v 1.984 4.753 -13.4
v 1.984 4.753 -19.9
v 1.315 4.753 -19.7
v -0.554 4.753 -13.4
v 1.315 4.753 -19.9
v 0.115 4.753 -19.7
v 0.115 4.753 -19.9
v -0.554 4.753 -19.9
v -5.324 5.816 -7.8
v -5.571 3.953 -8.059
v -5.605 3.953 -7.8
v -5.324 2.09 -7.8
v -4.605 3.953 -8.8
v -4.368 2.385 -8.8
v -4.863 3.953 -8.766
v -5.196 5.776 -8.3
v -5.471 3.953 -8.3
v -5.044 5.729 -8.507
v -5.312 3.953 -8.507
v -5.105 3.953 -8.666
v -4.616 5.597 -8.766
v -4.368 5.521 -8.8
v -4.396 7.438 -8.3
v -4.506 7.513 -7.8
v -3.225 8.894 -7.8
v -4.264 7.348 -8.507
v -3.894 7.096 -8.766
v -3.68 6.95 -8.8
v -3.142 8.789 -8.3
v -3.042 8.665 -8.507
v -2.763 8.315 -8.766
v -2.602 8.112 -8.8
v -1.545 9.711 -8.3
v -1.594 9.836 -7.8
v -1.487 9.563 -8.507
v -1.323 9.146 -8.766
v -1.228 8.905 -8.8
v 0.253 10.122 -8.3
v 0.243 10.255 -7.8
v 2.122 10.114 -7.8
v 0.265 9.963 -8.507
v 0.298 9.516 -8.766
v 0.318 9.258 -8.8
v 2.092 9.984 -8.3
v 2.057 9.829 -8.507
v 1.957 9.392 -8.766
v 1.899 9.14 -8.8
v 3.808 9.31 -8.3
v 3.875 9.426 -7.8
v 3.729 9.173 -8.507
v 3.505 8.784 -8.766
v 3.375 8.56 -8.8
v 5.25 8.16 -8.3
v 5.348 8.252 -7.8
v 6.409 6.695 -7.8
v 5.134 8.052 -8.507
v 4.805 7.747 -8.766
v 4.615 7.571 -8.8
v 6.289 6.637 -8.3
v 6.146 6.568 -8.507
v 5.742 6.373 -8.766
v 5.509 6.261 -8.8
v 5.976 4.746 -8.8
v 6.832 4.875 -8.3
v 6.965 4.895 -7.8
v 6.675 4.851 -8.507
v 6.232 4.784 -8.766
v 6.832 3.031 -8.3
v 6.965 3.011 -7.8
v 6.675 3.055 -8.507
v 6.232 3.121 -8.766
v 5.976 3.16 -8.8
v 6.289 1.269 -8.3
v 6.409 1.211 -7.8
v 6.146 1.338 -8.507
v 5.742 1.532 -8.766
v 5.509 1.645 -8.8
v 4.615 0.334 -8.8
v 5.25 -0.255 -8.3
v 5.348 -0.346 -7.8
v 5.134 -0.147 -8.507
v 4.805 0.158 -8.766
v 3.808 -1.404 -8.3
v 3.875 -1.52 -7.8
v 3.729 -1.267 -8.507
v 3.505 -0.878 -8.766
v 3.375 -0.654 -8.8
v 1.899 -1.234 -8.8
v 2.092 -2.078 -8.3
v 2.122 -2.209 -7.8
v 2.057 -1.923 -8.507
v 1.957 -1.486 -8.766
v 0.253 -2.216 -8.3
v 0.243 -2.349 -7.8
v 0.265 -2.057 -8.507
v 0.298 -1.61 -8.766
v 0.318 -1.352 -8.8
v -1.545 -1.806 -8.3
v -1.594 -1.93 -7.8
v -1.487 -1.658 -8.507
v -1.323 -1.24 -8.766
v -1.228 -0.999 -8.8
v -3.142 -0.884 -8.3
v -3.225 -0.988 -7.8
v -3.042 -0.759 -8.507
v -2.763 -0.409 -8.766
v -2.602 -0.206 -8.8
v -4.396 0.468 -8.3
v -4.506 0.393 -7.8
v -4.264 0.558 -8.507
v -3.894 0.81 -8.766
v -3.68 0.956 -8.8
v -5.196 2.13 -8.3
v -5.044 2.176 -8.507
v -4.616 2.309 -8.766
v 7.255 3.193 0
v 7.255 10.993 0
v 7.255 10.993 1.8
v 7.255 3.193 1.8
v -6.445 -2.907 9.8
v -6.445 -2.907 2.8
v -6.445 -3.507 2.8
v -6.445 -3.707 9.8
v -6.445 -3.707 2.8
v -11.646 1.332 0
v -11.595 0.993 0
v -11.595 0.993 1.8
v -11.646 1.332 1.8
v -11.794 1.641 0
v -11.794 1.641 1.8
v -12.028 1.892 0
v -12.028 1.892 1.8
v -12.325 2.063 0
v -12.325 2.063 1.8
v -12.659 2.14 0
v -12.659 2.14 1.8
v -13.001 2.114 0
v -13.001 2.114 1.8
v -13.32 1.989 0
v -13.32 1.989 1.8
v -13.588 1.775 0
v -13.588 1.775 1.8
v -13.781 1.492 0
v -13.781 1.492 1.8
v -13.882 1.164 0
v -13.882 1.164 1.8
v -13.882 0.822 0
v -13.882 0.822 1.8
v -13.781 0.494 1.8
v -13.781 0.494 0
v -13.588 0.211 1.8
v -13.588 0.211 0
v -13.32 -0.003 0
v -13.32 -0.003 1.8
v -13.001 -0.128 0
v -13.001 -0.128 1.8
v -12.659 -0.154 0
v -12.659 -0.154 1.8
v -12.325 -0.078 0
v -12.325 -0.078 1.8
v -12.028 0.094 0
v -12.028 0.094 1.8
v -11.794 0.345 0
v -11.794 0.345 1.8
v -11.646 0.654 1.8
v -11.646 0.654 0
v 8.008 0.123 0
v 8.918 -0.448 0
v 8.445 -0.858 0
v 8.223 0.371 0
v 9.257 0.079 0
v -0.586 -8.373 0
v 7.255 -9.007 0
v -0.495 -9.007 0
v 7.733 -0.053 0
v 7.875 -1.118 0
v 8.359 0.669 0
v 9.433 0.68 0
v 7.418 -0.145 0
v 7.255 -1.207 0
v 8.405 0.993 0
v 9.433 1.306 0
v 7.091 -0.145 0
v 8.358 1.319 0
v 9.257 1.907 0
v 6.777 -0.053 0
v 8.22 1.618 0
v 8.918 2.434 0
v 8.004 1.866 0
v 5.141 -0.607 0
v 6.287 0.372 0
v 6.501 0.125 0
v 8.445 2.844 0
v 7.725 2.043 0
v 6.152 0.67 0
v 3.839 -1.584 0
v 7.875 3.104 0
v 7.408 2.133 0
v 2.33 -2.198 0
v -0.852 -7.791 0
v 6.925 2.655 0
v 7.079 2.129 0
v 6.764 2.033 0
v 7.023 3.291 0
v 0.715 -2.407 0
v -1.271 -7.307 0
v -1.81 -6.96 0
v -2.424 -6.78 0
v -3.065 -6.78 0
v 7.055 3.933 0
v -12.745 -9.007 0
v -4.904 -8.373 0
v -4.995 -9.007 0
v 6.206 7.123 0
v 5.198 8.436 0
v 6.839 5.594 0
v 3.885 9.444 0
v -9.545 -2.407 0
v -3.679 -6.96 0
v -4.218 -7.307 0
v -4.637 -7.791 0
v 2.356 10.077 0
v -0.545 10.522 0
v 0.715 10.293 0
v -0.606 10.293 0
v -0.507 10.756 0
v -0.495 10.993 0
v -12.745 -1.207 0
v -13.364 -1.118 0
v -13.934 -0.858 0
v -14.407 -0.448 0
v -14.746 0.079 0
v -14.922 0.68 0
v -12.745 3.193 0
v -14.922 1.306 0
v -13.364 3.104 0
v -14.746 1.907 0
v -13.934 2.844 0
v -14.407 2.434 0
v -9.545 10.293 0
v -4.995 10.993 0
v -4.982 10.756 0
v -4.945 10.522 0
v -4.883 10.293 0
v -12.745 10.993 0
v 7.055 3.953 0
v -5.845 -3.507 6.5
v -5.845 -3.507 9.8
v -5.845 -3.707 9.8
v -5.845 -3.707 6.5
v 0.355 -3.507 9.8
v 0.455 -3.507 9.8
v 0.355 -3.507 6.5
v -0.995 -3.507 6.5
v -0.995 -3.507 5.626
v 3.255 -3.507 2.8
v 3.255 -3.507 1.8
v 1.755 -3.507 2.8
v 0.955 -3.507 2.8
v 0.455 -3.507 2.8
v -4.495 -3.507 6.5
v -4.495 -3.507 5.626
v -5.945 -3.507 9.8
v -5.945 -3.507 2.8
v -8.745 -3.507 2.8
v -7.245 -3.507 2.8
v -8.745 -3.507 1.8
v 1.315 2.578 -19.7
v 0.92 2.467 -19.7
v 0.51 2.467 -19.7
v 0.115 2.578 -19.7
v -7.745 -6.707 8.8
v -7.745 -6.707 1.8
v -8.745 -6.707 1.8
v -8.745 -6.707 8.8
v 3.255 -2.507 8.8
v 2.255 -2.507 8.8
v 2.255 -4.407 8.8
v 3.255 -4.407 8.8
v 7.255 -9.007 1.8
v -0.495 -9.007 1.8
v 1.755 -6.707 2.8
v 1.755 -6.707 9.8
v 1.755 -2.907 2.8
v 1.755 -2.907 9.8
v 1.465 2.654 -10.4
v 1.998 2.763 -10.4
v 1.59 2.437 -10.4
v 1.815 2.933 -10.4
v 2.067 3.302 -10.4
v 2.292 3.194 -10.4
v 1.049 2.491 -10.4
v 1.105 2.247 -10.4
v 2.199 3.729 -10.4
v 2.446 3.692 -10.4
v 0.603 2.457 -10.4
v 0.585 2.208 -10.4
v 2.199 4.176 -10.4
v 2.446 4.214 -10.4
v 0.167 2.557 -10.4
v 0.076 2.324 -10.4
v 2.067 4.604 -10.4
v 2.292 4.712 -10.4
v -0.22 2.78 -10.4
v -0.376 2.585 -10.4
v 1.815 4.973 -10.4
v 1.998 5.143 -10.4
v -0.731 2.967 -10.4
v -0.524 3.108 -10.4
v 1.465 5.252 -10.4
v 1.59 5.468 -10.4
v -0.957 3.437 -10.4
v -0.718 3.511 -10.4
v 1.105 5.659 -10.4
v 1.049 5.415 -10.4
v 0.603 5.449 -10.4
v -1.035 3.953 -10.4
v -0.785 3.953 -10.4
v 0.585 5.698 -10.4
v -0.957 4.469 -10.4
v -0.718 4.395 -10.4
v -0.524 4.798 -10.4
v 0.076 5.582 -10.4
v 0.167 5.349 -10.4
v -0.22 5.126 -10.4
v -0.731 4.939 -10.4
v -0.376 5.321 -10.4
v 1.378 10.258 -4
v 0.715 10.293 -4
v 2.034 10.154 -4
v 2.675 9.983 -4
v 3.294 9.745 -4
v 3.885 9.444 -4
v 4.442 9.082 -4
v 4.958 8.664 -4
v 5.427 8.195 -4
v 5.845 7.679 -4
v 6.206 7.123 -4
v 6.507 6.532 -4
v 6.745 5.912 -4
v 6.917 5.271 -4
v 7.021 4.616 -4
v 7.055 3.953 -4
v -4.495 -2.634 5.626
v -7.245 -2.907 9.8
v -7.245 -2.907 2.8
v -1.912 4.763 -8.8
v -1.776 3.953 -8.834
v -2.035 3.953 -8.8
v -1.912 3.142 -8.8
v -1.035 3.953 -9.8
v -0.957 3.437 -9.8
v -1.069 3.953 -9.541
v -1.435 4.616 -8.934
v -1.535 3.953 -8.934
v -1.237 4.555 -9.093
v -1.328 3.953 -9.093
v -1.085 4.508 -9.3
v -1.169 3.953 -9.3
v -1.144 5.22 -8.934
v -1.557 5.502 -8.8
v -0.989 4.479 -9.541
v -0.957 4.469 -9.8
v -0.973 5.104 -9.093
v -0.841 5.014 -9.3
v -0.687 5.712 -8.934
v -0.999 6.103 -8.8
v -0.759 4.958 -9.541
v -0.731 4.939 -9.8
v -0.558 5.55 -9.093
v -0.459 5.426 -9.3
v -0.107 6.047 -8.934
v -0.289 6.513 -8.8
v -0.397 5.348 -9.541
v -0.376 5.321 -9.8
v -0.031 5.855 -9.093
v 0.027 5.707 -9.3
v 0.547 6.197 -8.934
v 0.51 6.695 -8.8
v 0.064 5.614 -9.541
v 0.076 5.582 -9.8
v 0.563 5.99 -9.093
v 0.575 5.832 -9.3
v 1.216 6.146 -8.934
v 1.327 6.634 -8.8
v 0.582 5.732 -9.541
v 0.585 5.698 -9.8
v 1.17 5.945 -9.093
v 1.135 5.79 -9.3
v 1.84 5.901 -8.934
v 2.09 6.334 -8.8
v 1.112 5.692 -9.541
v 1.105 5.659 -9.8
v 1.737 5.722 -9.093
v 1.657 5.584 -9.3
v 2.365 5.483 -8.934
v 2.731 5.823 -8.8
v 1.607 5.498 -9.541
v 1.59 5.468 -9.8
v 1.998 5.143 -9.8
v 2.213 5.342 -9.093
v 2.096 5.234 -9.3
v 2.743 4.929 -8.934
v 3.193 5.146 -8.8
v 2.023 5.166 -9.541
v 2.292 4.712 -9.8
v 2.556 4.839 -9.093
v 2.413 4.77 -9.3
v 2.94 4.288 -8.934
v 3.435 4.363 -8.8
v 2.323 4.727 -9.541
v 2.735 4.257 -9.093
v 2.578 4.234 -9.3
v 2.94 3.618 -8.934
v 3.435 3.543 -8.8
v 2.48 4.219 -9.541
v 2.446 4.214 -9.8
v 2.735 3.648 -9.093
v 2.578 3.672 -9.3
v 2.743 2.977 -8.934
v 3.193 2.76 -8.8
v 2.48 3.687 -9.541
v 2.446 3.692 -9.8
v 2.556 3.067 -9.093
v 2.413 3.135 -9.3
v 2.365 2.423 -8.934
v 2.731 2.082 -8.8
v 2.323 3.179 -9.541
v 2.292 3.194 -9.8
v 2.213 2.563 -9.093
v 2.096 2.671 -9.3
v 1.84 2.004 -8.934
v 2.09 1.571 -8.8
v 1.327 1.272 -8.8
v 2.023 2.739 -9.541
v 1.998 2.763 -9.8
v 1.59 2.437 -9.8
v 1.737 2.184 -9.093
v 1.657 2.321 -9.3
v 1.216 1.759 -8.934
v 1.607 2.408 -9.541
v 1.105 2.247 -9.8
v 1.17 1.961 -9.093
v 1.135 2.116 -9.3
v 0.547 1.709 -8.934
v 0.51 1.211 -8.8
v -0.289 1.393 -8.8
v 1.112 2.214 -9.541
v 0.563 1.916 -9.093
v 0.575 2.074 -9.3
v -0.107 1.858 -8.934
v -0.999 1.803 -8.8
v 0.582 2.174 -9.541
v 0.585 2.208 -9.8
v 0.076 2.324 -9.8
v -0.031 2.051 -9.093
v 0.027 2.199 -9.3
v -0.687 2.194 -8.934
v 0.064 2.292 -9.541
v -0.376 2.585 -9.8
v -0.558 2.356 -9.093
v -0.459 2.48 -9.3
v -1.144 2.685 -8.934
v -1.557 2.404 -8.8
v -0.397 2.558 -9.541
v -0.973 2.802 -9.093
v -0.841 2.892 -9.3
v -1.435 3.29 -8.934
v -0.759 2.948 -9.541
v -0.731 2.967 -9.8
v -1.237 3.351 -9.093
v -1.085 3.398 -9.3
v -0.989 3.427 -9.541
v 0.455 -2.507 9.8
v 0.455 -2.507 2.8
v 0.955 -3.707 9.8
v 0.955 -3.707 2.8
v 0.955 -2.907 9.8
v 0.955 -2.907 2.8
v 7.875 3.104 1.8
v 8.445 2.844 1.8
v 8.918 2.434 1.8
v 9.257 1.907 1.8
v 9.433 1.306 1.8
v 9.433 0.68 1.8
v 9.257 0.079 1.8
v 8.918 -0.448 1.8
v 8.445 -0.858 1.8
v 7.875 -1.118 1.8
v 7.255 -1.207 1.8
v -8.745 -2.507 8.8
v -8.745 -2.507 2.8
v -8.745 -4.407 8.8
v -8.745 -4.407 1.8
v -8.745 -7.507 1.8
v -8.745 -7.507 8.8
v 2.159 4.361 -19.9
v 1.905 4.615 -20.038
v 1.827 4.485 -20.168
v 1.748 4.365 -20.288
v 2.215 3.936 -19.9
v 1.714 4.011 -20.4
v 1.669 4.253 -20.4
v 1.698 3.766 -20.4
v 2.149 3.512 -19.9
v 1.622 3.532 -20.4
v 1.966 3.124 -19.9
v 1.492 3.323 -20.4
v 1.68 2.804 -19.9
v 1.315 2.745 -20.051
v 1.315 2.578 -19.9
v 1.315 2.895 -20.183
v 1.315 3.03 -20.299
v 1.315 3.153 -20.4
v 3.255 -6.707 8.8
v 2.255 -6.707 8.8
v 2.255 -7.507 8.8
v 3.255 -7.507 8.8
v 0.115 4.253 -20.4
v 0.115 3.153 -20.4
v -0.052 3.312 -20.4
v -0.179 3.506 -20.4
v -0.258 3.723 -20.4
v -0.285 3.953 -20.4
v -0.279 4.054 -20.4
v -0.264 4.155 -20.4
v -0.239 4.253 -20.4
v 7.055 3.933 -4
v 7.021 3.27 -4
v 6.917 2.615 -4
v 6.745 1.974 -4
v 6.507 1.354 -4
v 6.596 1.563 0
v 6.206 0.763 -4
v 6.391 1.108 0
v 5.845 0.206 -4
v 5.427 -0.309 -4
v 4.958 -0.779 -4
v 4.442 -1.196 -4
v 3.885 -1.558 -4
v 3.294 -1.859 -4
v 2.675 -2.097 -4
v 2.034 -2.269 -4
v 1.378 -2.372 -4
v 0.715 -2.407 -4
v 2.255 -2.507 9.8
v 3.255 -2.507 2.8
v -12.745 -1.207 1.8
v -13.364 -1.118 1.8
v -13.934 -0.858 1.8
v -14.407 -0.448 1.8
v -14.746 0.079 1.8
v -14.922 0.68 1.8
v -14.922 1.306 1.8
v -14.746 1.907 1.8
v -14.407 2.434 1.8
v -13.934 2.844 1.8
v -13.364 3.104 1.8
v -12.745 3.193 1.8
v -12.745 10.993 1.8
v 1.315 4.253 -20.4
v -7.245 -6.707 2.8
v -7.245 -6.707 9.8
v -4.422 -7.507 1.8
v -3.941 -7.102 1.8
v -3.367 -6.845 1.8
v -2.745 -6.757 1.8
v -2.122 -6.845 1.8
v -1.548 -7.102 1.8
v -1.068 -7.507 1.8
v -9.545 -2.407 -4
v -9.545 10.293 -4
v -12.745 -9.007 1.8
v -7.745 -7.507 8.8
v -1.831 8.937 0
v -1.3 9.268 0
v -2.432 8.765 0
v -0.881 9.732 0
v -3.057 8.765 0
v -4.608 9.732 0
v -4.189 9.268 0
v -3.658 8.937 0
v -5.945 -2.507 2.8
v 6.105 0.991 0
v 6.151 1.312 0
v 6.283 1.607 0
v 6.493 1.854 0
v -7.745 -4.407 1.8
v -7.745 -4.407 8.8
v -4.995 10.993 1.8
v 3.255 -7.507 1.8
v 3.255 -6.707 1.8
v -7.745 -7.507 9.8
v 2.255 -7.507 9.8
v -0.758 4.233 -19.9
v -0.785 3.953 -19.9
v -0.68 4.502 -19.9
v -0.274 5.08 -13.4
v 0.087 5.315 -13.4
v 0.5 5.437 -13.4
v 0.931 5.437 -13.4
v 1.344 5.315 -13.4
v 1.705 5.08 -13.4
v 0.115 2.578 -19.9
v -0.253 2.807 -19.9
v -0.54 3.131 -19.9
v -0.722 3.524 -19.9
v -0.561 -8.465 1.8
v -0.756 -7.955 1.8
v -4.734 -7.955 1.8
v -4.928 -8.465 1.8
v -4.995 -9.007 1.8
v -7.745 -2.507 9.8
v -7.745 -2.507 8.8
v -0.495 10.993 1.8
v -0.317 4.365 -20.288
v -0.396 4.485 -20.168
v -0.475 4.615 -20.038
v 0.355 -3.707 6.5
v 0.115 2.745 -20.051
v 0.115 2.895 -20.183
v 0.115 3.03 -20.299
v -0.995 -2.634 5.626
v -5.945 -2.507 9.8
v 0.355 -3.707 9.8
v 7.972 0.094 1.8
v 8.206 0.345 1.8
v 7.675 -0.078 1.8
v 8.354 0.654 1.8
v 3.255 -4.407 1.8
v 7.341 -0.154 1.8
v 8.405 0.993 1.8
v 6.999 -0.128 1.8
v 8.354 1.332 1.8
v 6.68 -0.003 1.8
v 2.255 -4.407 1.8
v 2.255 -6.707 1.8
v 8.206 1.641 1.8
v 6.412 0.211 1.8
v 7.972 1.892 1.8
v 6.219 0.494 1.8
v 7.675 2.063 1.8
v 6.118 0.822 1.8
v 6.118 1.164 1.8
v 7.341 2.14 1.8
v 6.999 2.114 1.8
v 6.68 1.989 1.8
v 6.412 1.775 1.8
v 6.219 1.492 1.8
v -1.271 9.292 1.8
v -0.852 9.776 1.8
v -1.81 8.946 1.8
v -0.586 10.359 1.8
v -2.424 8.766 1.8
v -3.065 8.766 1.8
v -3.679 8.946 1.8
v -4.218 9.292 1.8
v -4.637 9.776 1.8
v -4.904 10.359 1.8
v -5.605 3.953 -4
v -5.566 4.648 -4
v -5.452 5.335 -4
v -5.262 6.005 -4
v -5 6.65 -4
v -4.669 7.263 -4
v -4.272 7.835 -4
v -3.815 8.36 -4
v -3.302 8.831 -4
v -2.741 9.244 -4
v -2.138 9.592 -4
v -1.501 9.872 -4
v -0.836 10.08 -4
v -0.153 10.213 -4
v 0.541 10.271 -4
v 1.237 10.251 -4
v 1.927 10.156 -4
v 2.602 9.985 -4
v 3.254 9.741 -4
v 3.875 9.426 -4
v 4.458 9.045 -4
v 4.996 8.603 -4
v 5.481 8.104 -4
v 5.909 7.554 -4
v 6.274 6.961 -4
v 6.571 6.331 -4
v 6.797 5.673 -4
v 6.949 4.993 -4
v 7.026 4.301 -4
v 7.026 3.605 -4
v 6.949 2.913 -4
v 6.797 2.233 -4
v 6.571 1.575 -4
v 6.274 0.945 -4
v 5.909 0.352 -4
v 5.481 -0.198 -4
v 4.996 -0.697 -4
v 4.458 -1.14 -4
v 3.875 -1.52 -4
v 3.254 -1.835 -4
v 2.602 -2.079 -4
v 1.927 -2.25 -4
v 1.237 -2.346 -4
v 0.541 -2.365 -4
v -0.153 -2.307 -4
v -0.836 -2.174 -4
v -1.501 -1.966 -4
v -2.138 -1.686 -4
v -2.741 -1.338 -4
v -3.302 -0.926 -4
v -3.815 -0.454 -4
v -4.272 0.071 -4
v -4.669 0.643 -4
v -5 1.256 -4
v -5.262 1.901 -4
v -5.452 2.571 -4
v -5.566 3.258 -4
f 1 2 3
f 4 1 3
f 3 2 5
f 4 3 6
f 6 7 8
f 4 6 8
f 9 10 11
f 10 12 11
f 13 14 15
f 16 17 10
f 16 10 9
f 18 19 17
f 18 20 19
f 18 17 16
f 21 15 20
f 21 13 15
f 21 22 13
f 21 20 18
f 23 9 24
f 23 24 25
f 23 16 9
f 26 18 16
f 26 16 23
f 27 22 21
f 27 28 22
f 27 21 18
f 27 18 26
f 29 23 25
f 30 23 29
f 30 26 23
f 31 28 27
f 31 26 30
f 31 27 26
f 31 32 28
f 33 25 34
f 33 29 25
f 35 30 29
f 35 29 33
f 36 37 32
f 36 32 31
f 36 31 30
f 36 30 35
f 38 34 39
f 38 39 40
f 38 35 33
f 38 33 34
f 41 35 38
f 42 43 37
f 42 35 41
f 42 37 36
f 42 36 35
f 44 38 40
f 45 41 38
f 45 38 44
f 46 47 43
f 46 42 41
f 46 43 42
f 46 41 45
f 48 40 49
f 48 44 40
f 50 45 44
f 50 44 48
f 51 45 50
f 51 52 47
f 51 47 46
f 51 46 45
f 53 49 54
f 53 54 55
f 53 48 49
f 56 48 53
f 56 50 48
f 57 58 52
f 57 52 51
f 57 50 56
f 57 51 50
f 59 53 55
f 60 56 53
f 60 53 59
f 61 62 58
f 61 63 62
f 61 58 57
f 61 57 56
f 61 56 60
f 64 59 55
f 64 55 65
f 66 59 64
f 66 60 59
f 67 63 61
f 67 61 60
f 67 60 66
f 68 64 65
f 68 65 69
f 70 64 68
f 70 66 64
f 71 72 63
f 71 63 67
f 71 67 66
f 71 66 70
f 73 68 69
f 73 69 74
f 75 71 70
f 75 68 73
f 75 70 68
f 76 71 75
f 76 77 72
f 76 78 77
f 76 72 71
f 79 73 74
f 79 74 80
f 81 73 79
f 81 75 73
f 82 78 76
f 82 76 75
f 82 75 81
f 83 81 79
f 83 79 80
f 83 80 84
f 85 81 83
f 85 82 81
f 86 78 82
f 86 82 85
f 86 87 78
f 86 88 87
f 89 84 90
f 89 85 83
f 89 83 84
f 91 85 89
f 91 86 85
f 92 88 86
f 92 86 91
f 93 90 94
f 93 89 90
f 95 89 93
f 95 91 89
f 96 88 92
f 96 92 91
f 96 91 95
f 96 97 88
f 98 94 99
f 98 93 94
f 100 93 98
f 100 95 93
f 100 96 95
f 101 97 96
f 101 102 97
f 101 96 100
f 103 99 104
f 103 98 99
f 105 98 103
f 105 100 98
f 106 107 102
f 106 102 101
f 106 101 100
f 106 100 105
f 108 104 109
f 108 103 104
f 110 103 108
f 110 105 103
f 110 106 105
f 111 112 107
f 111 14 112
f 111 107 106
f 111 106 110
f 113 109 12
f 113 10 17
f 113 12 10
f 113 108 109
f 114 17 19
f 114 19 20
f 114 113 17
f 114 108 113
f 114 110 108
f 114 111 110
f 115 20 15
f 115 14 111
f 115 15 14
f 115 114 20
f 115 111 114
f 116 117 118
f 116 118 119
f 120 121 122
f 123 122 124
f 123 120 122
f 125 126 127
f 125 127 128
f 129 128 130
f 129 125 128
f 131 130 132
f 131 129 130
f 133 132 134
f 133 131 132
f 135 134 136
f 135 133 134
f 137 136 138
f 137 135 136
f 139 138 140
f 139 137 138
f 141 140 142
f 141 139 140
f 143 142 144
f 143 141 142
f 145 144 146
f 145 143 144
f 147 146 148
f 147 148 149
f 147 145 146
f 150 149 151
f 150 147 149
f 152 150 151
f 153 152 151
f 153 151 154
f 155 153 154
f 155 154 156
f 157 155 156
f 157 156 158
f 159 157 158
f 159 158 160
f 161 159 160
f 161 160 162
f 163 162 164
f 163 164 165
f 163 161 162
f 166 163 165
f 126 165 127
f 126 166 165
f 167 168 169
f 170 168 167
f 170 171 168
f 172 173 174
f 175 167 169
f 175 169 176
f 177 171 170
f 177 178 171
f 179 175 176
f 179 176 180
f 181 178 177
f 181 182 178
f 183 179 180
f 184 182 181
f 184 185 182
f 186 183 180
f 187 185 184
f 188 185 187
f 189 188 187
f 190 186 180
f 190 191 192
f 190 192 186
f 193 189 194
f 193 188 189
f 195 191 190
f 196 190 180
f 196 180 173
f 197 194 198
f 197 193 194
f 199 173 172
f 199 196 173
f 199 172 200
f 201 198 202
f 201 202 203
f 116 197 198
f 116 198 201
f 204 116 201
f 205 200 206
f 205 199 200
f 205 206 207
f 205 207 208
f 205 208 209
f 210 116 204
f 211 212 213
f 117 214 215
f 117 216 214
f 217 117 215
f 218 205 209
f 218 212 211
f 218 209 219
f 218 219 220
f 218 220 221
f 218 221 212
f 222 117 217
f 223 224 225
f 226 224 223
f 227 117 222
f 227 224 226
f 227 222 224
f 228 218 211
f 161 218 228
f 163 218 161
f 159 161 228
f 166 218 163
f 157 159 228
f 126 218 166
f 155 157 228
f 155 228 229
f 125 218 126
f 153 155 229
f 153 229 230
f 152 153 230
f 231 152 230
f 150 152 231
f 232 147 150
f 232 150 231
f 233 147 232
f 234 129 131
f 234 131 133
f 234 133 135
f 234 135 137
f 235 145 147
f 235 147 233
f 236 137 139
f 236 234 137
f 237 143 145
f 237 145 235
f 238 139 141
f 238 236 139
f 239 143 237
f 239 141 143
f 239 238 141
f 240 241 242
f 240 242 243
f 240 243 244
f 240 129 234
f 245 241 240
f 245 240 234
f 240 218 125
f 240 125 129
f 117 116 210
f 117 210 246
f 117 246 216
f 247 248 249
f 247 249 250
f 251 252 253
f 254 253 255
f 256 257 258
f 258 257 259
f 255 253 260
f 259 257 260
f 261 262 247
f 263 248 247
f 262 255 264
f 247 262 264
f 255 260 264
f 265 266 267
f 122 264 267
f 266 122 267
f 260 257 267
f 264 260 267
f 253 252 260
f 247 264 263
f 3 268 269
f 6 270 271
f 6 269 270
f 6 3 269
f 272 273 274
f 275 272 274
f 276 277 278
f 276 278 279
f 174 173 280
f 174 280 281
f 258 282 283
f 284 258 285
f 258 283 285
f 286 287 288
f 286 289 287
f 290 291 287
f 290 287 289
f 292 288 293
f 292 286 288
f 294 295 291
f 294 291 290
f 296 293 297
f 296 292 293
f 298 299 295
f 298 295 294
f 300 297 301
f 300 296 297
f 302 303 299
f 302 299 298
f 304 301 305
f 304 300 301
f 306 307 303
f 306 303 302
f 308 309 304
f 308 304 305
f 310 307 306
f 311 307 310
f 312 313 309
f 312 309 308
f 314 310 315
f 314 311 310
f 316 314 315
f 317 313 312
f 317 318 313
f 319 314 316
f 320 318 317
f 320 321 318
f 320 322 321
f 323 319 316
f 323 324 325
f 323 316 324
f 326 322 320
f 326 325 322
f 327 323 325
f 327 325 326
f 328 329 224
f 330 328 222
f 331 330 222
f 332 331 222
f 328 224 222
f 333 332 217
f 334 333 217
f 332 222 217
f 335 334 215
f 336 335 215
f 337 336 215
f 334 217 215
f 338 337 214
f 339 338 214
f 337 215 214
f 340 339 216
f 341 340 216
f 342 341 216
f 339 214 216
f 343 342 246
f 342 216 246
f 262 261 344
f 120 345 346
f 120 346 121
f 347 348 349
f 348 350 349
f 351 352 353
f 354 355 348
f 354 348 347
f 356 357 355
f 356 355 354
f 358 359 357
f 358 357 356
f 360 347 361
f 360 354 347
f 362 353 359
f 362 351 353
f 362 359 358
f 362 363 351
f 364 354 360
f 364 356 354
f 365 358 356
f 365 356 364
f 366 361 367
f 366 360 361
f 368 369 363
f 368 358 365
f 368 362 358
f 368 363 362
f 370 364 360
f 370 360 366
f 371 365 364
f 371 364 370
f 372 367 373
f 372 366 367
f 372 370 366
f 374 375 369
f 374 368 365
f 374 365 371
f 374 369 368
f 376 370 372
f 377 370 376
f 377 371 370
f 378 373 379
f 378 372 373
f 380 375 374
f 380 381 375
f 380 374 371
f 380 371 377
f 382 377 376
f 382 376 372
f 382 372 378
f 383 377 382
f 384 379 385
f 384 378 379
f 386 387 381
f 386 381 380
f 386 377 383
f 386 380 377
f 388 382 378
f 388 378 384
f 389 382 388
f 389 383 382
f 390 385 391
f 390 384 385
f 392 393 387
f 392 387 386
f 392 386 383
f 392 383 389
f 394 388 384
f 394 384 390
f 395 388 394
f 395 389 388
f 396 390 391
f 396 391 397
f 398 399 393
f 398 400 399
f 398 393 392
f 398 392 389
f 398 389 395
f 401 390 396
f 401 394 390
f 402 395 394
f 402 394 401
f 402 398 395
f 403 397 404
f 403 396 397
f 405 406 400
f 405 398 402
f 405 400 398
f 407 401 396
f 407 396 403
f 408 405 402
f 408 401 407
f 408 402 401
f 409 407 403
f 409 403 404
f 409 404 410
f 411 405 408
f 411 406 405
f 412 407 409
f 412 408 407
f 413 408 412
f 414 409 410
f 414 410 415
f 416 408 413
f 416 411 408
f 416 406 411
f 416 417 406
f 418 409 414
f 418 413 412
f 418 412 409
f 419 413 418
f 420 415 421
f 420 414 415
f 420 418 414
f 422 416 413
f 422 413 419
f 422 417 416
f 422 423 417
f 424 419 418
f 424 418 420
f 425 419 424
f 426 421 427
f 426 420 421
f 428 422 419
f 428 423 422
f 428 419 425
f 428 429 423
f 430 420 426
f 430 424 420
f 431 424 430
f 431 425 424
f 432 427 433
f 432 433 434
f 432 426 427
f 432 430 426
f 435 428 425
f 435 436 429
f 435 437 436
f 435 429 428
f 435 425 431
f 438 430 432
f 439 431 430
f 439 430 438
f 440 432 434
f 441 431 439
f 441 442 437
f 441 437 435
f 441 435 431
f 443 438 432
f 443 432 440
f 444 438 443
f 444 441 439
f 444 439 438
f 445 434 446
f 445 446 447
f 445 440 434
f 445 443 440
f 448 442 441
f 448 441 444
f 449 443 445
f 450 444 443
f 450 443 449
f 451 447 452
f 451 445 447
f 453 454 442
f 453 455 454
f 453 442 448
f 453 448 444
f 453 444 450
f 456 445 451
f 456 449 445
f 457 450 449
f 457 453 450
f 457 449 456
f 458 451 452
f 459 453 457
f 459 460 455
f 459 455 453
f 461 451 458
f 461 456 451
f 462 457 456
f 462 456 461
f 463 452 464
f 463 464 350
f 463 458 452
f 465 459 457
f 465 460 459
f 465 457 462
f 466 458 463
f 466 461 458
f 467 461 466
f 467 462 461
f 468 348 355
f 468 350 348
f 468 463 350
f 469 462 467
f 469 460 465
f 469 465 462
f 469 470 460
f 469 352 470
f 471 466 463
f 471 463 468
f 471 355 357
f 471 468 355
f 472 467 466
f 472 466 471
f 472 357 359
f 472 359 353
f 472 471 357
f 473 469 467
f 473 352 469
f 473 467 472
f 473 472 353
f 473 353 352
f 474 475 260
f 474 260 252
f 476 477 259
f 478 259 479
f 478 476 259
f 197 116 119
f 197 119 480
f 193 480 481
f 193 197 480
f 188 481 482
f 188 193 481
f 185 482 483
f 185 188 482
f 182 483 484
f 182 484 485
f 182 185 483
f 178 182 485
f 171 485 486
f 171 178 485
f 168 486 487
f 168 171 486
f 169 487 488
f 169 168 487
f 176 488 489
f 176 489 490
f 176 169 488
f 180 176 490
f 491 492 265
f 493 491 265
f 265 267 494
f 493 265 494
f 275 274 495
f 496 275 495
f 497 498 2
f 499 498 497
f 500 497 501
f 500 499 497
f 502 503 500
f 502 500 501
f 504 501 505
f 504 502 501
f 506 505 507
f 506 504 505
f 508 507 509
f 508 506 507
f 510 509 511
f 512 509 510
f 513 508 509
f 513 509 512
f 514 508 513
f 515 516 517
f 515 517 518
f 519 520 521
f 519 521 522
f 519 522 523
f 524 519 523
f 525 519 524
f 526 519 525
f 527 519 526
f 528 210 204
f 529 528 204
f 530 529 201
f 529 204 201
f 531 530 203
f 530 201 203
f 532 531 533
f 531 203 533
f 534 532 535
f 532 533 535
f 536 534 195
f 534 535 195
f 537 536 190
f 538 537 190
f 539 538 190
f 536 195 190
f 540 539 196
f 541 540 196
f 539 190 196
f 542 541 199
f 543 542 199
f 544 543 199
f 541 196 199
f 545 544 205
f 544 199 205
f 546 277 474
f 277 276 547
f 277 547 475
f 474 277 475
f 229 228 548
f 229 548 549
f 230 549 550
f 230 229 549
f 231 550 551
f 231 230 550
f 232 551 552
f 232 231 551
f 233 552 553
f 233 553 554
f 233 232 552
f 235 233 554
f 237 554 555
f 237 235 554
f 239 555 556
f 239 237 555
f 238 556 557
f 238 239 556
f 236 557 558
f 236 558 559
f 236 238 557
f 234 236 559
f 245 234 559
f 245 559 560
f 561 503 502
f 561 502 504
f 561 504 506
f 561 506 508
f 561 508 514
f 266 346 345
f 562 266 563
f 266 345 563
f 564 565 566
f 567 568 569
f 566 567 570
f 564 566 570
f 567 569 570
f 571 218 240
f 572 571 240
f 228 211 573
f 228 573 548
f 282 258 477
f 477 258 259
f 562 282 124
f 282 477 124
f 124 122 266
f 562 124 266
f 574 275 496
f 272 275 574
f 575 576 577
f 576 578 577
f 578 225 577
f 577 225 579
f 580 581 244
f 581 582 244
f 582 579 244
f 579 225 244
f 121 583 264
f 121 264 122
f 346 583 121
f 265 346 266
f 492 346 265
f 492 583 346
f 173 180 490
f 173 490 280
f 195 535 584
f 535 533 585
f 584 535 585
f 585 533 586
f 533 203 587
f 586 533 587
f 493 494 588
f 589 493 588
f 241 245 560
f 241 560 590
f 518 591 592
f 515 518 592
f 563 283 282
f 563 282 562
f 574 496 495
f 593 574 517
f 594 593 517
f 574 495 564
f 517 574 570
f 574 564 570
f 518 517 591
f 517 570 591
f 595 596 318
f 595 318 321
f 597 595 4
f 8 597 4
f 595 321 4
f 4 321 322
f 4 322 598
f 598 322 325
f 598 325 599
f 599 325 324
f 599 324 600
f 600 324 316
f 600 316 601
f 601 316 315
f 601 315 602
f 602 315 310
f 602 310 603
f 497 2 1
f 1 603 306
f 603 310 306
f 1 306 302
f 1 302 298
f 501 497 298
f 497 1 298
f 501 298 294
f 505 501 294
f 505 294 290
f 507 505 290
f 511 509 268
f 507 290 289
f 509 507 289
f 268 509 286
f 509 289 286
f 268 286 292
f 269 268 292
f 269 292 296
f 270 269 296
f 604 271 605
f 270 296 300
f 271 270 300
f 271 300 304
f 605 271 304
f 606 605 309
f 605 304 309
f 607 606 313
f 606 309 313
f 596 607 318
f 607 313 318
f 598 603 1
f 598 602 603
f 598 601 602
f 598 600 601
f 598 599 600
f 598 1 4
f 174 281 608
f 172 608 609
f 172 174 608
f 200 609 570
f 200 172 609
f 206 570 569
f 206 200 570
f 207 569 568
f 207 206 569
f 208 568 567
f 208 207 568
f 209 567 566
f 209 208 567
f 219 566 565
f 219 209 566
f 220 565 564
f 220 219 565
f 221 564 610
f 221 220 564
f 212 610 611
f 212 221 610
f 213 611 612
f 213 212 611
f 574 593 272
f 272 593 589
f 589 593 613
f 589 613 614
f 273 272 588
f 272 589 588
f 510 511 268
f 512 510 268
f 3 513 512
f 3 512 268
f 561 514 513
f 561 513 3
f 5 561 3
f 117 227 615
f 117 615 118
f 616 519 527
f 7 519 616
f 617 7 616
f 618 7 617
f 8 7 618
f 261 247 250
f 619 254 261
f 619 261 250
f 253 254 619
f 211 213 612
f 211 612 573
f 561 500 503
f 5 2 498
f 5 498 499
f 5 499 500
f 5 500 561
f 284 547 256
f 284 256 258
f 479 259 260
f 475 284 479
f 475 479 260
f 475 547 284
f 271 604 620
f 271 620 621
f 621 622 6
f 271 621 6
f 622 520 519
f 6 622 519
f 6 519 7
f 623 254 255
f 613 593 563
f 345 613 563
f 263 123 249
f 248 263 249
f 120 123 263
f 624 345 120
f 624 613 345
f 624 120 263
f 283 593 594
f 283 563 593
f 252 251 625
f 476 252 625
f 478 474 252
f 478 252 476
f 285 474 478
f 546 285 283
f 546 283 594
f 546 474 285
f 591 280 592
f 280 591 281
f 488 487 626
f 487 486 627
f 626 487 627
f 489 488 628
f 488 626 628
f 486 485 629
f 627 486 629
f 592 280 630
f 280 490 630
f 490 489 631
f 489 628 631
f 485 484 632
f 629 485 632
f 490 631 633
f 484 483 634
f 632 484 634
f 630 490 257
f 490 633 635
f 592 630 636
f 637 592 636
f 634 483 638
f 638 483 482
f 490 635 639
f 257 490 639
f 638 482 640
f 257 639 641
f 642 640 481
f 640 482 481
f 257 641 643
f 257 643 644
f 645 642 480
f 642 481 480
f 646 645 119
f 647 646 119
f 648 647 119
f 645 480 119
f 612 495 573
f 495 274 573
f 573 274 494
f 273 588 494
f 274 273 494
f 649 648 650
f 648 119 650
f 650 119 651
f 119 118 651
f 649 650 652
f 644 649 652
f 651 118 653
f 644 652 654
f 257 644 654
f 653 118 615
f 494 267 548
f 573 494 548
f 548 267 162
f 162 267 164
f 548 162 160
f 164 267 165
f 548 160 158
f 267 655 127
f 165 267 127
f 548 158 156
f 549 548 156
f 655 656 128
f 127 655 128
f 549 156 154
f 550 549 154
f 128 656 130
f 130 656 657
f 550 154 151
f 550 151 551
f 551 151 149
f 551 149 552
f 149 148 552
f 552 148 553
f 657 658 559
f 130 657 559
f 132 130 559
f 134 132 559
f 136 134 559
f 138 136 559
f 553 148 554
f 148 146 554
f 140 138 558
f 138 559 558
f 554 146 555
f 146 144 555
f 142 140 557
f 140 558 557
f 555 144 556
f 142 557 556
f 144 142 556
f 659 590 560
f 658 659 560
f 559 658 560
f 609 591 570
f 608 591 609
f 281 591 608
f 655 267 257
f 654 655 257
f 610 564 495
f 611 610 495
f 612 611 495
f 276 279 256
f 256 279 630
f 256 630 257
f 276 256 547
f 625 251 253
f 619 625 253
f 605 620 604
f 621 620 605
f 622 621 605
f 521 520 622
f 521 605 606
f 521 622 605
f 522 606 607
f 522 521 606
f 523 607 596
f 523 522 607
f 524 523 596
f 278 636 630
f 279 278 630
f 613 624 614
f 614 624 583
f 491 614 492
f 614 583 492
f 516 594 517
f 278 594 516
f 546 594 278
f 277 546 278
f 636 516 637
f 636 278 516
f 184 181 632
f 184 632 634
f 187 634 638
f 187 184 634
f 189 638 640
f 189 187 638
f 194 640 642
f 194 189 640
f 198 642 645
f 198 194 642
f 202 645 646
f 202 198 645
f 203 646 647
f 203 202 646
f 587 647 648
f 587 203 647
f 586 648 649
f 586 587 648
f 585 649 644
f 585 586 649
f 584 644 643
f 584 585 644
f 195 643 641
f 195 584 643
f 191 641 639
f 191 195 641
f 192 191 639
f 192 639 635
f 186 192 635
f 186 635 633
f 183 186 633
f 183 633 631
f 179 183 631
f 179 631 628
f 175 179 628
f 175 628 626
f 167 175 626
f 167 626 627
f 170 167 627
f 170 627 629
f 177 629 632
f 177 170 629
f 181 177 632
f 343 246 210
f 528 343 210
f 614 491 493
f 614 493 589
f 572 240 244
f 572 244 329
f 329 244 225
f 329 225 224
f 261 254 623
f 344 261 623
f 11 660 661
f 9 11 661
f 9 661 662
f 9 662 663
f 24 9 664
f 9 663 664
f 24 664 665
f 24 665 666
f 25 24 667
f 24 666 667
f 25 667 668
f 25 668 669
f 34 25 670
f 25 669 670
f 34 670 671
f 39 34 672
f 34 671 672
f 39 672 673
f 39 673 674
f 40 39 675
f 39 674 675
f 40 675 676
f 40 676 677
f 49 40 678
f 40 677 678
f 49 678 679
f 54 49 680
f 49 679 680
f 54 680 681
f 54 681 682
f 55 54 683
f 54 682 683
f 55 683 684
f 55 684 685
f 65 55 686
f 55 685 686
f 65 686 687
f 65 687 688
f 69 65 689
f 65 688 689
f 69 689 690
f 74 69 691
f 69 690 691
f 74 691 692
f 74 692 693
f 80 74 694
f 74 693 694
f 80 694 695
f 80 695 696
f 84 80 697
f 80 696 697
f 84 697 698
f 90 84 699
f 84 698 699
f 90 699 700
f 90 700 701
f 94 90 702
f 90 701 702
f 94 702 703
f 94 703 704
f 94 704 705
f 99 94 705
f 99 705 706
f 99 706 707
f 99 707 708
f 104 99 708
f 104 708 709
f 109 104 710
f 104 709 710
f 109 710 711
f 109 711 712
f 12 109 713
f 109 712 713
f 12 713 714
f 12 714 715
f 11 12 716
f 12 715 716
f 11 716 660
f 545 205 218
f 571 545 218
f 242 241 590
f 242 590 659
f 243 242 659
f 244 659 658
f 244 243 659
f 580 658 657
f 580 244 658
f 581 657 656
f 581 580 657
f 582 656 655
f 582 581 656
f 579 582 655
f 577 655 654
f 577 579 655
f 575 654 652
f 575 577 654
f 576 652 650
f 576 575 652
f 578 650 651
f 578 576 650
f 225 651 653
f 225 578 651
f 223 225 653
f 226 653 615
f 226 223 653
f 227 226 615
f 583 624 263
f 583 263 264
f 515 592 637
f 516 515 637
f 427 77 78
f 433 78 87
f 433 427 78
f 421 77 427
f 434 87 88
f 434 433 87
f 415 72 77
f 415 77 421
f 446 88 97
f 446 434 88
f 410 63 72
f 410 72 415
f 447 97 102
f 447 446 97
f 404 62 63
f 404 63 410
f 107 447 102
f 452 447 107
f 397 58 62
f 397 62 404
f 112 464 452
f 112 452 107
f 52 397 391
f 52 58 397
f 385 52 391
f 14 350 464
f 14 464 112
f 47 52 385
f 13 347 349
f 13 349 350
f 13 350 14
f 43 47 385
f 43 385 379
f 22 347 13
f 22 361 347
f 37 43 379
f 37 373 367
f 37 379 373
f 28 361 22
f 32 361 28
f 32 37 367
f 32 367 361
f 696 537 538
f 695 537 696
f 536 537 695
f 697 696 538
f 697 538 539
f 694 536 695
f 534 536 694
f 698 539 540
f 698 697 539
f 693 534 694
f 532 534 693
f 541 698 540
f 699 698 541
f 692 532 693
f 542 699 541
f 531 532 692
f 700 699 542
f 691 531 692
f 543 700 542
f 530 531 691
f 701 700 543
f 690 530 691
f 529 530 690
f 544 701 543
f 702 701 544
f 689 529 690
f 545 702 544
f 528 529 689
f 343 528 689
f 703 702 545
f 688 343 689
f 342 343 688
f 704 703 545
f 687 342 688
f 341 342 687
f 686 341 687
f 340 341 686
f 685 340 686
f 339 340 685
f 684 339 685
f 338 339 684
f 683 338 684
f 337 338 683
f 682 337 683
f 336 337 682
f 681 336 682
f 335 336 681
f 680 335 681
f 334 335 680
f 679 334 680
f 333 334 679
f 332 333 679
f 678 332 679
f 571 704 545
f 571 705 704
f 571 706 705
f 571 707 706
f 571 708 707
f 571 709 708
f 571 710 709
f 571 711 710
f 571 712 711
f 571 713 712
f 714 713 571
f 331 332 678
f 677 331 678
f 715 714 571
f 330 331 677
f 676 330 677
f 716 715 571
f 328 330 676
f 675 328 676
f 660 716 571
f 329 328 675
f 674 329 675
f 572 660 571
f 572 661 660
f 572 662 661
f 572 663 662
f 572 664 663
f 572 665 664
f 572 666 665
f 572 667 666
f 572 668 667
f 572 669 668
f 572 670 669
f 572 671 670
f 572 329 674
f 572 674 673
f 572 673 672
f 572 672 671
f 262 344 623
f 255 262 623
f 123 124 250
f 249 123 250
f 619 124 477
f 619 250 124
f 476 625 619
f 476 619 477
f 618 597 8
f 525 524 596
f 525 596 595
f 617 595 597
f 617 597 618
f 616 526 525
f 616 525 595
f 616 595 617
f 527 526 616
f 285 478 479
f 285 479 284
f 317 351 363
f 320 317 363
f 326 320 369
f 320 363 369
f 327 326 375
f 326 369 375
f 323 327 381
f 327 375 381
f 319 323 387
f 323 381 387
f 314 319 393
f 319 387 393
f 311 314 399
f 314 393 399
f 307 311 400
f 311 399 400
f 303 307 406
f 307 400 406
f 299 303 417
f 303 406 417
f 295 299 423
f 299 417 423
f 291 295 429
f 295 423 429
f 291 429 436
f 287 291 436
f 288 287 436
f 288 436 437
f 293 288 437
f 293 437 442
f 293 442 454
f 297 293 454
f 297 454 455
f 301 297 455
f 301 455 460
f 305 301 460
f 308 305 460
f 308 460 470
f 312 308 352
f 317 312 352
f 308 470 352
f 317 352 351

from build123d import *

# Parameters (mm, degrees)
ESQUISSE1_R             = 1.15
BOSS_EXTRU_1_DEPTH      = 1.8
BOSS_EXTRU_2_DEPTH      = 8
ENL_V_MAT_EXTRU_1_DEPTH = 7
ESQUISSE4_W             = 3.5
ESQUISSE4_H             = 0.873592076
ENL_V_MAT_EXTRU_2_DEPTH = 1
ESQUISSE5_W             = 1
ESQUISSE5_H             = 1
ENL_V_MAT_EXTRU_3_DEPTH = 11
ESQUISSE6_W             = 6.2
ESQUISSE6_H             = 3.3
ENL_V_MAT_EXTRU_4_DEPTH = 1
CHANFREIN1_SIZE         = 1
BOSS_EXTRU_3_DEPTH      = 4
ESQUISSE8_R             = 6.32
BOSS_EXTRU_4_DEPTH      = 4.8
CONG_1_R                = 1
ESQUISSE10_R            = 1.75
BOSS_EXTRU_5_DEPTH      = 1.6
CONG_2_R                = 1
ESQUISSE11_R            = 1.5
BOSS_EXTRU_6_DEPTH      = 10
ESQUISSE12_W            = 2.890262719
ESQUISSE12_H            = 1.095500593
ENL_V_MAT_EXTRU_7_DEPTH = 7
CHANFREIN2_SIZE         = 0.5
ESQUISSE13_W            = 1.2
ESQUISSE13_H            = 2.827300788
ENL_V_MAT_EXTRU_8_DEPTH = 0.7


with BuildPart() as part:
    # Esquisse1 → Boss.-Extru.1 (new body)
    with BuildSketch(Plane.XY):
        with BuildLine():
            Line((-12.744645331, 10.992907801), (-4.994645331, 10.992907801))
            ThreePointArc((-4.994645331, 10.992907801), (-2.744645331, 8.742907801), (-0.494645331, 10.992907801))
            Line((-0.494645331, 10.992907801), (7.255354669, 10.992907801))
            Line((7.255354669, 10.992907801), (7.255354669, 3.192907801))
            ThreePointArc((7.255354669, 3.192907801), (9.455354669, 0.992907801), (7.255354669, -1.207092199))
            Line((7.255354669, -1.207092199), (7.255354669, -9.007092199))
            Line((7.255354669, -9.007092199), (-0.494645331, -9.007092199))
            ThreePointArc((-0.494645331, -9.007092199), (-2.744645331, -6.757092199), (-4.994645331, -9.007092199))
            Line((-4.994645331, -9.007092199), (-12.744645331, -9.007092199))
            Line((-12.744645331, -9.007092199), (-12.744645331, -1.207092199))
            ThreePointArc((-12.744645331, -1.207092199), (-14.944645331, 0.992907801), (-12.744645331, 3.192907801))
            Line((-12.744645331, 3.192907801), (-12.744645331, 10.992907801))
        make_face()
        with Locations((-12.744645331, 0.992907801)):
            Circle(ESQUISSE1_R, mode=Mode.SUBTRACT)
        with Locations((7.255354669, 0.992907801)):
            Circle(ESQUISSE1_R, mode=Mode.SUBTRACT)
    extrude(amount=BOSS_EXTRU_1_DEPTH)

    # Esquisse2 → Boss.-Extru.2 (add)
    with BuildSketch(Plane.XY.offset(1.8)):
        Polygon((-8.744645331, -7.507092199), (3.255354669, -7.507092199), (3.255354669, -6.707092199), (2.255354669, -6.707092199), (2.255354669, -4.407092199), (3.255354669, -4.407092199), (3.255354669, -2.507092199), (-8.744645331, -2.507092199), (-8.744645331, -4.407092199), (-7.744645331, -4.407092199), (-7.744645331, -6.707092199), (-8.744645331, -6.707092199), align=None)
    extrude(amount=BOSS_EXTRU_2_DEPTH)

    # Esquisse3 → Enlèv. mat.-Extru.1 (cut)
    with BuildSketch(Plane.XY.offset(9.8)):
        Polygon((-6.444645331, -3.707092199), (0.955354669, -3.707092199), (0.955354669, -2.907092199), (1.755354669, -2.907092199), (1.755354669, -3.707092199), (1.755354669, -6.707092199), (-7.244645331, -6.707092199), (-7.244645331, -3.707092199), (-7.244645331, -2.907092199), (-6.444645331, -2.907092199), align=None)
    extrude(amount=-ENL_V_MAT_EXTRU_1_DEPTH, mode=Mode.SUBTRACT)

    # Esquisse4 → Enlèv. mat.-Extru.2 (cut)
    with BuildSketch(Plane(origin=(0, -2.507092199, 0), x_dir=(1, 0, 0), z_dir=(0, 1, 0))):
        Polygon((-8.744645331, -1.8), (3.255354669, -1.8), (3.255354669, -2.8), (0.455354669, -2.8), (0.455354669, -9.8), (-5.944645331, -9.8), (-5.944645331, -2.8), (-8.744645331, -2.8), align=None)
        with Locations((-2.744645331, -6.063203962)):
            Rectangle(ESQUISSE4_W, ESQUISSE4_H, mode=Mode.SUBTRACT)
    extrude(amount=-ENL_V_MAT_EXTRU_2_DEPTH, mode=Mode.SUBTRACT)

    # Esquisse5 → Enlèv. mat.-Extru.3 (cut)
    with BuildSketch(Plane(origin=(0, -2.507092199, 0), x_dir=(1, 0, 0), z_dir=(0, 1, 0))):
        with Locations((-8.244645331, -9.3)):
            Rectangle(ESQUISSE5_W, ESQUISSE5_H)
        with Locations((2.755354669, -9.3)):
            Rectangle(ESQUISSE5_W, ESQUISSE5_H)
    extrude(amount=-ENL_V_MAT_EXTRU_3_DEPTH, mode=Mode.SUBTRACT)

    # Esquisse6 → Enlèv. mat.-Extru.4 (cut)
    with BuildSketch(Plane(origin=(0, -3.507092199, 0), x_dir=(1, 0, 0), z_dir=(0, 1, 0))):
        with Locations((-2.744645331, -8.15)):
            Rectangle(ESQUISSE6_W, ESQUISSE6_H)
    extrude(amount=-ENL_V_MAT_EXTRU_4_DEPTH, mode=Mode.SUBTRACT)

    # Chanfrein1
    # the kernel refuses this chamfer: 1 mm, written as the material it takes off along each edge
    with BuildSketch(Plane(origin=(1.577037657, -2.507092199, 6.5), x_dir=(0, -0.9996219169112968, 0.027495876610586487), z_dir=(-1, 0, 0))) as chanfrein1_piece_1_section:
        Polygon((CHANFREIN1_SIZE * 0.999621916911, -CHANFREIN1_SIZE * 0.0274958766106), (-CHANFREIN1_SIZE * 0.0274958766106, -CHANFREIN1_SIZE * 0.999621916911), (0, 0), align=None)
    chanfrein1_piece_1 = extrude(amount=6.071682988, mode=Mode.PRIVATE)
    chanfrein1_piece_1 = split(chanfrein1_piece_1, bisect_by=Plane(origin=(0.455354669, -3.107092199, 6.3), z_dir=(-1, 0, 0)), keep=Keep.TOP, mode=Mode.PRIVATE)
    add(chanfrein1_piece_1, mode=Mode.SUBTRACT)

    # Esquisse7 → Boss.-Extru.3 (add)
    with BuildSketch(Plane(origin=(0, 0, 0), x_dir=(-1, 0, 0), z_dir=(0, 0, -1))):
        with BuildLine():
            Line((9.544645331, 10.292907801), (-0.715354669, 10.292907801))
            ThreePointArc((-0.715354669, 10.292907801), (-5.198411662, 8.435964794), (-7.055354669, 3.952907801))
            Line((-7.055354669, 3.952907801), (-7.055354669, 3.932907801))
            ThreePointArc((-7.055354669, 3.932907801), (-5.198411662, -0.550149191), (-0.715354669, -2.407092199))
            Line((-0.715354669, -2.407092199), (9.544645331, -2.407092199))
            Line((9.544645331, -2.407092199), (9.544645331, 10.292907801))
        make_face()
    extrude(amount=BOSS_EXTRU_3_DEPTH)

    # Esquisse8 → Boss.-Extru.4 (add)
    with BuildSketch(Plane(origin=(0, 0, -4), x_dir=(-1, 0, 0), z_dir=(0, 0, -1))):
        with Locations((-0.715354669, 3.952907801)):
            Circle(ESQUISSE8_R)
    extrude(amount=BOSS_EXTRU_4_DEPTH)

    # Congé1
    cong_1_edges = [part.edges().sort_by_distance(p)[0] for p in [
        (7.035354669, 3.952907801, -8.8),
    ]]
    fillet(cong_1_edges, radius=CONG_1_R)

    # Esquisse10 → Boss.-Extru.5 (add)
    with BuildSketch(Plane(origin=(0, 0, -8.8), x_dir=(-1, 0, 0), z_dir=(0, 0, -1))):
        with Locations((-0.715354669, 3.952907801)):
            Circle(ESQUISSE10_R)
    extrude(amount=BOSS_EXTRU_5_DEPTH)

    # Congé2
    cong_2_edges = [part.edges().sort_by_distance(p)[0] for p in [
        (2.465354669, 3.952907801, -8.8),
    ]]
    fillet(cong_2_edges, radius=CONG_2_R)

    # Esquisse11 → Boss.-Extru.6 (add)
    with BuildSketch(Plane(origin=(0, 0, -10.4), x_dir=(-1, 0, 0), z_dir=(0, 0, -1))):
        with Locations((-0.715354669, 3.952907801)):
            Circle(ESQUISSE11_R)
    extrude(amount=BOSS_EXTRU_6_DEPTH)

    # Esquisse12 → Enlèv. mat.-Extru.7 (cut)
    with BuildSketch(Plane(origin=(0, 0, -20.4), x_dir=(-1, 0, 0), z_dir=(0, 0, -1))):
        with Locations((-0.539081064, 5.300658098)):
            Rectangle(ESQUISSE12_W, ESQUISSE12_H)
    extrude(amount=-ENL_V_MAT_EXTRU_7_DEPTH, mode=Mode.SUBTRACT)

    # Chanfrein2
    chanfrein2_edges = [part.edges().sort_by_distance(p)[0] for p in [
        (1.131715912, 2.511851482, -20.4),
        (0.715354669, 4.752907801, -20.4),
    ]]
    chamfer(chanfrein2_edges, length=CHANFREIN2_SIZE)

    # Esquisse13 → Enlèv. mat.-Extru.8 (cut)
    with BuildSketch(Plane(origin=(0, 0, -20.4), x_dir=(-1, 0, 0), z_dir=(0, 0, -1))):
        with Locations((-0.715354669, 3.515442174)):
            Rectangle(ESQUISSE13_W, ESQUISSE13_H)
    extrude(amount=-ENL_V_MAT_EXTRU_8_DEPTH, mode=Mode.SUBTRACT)


solid = part.part
